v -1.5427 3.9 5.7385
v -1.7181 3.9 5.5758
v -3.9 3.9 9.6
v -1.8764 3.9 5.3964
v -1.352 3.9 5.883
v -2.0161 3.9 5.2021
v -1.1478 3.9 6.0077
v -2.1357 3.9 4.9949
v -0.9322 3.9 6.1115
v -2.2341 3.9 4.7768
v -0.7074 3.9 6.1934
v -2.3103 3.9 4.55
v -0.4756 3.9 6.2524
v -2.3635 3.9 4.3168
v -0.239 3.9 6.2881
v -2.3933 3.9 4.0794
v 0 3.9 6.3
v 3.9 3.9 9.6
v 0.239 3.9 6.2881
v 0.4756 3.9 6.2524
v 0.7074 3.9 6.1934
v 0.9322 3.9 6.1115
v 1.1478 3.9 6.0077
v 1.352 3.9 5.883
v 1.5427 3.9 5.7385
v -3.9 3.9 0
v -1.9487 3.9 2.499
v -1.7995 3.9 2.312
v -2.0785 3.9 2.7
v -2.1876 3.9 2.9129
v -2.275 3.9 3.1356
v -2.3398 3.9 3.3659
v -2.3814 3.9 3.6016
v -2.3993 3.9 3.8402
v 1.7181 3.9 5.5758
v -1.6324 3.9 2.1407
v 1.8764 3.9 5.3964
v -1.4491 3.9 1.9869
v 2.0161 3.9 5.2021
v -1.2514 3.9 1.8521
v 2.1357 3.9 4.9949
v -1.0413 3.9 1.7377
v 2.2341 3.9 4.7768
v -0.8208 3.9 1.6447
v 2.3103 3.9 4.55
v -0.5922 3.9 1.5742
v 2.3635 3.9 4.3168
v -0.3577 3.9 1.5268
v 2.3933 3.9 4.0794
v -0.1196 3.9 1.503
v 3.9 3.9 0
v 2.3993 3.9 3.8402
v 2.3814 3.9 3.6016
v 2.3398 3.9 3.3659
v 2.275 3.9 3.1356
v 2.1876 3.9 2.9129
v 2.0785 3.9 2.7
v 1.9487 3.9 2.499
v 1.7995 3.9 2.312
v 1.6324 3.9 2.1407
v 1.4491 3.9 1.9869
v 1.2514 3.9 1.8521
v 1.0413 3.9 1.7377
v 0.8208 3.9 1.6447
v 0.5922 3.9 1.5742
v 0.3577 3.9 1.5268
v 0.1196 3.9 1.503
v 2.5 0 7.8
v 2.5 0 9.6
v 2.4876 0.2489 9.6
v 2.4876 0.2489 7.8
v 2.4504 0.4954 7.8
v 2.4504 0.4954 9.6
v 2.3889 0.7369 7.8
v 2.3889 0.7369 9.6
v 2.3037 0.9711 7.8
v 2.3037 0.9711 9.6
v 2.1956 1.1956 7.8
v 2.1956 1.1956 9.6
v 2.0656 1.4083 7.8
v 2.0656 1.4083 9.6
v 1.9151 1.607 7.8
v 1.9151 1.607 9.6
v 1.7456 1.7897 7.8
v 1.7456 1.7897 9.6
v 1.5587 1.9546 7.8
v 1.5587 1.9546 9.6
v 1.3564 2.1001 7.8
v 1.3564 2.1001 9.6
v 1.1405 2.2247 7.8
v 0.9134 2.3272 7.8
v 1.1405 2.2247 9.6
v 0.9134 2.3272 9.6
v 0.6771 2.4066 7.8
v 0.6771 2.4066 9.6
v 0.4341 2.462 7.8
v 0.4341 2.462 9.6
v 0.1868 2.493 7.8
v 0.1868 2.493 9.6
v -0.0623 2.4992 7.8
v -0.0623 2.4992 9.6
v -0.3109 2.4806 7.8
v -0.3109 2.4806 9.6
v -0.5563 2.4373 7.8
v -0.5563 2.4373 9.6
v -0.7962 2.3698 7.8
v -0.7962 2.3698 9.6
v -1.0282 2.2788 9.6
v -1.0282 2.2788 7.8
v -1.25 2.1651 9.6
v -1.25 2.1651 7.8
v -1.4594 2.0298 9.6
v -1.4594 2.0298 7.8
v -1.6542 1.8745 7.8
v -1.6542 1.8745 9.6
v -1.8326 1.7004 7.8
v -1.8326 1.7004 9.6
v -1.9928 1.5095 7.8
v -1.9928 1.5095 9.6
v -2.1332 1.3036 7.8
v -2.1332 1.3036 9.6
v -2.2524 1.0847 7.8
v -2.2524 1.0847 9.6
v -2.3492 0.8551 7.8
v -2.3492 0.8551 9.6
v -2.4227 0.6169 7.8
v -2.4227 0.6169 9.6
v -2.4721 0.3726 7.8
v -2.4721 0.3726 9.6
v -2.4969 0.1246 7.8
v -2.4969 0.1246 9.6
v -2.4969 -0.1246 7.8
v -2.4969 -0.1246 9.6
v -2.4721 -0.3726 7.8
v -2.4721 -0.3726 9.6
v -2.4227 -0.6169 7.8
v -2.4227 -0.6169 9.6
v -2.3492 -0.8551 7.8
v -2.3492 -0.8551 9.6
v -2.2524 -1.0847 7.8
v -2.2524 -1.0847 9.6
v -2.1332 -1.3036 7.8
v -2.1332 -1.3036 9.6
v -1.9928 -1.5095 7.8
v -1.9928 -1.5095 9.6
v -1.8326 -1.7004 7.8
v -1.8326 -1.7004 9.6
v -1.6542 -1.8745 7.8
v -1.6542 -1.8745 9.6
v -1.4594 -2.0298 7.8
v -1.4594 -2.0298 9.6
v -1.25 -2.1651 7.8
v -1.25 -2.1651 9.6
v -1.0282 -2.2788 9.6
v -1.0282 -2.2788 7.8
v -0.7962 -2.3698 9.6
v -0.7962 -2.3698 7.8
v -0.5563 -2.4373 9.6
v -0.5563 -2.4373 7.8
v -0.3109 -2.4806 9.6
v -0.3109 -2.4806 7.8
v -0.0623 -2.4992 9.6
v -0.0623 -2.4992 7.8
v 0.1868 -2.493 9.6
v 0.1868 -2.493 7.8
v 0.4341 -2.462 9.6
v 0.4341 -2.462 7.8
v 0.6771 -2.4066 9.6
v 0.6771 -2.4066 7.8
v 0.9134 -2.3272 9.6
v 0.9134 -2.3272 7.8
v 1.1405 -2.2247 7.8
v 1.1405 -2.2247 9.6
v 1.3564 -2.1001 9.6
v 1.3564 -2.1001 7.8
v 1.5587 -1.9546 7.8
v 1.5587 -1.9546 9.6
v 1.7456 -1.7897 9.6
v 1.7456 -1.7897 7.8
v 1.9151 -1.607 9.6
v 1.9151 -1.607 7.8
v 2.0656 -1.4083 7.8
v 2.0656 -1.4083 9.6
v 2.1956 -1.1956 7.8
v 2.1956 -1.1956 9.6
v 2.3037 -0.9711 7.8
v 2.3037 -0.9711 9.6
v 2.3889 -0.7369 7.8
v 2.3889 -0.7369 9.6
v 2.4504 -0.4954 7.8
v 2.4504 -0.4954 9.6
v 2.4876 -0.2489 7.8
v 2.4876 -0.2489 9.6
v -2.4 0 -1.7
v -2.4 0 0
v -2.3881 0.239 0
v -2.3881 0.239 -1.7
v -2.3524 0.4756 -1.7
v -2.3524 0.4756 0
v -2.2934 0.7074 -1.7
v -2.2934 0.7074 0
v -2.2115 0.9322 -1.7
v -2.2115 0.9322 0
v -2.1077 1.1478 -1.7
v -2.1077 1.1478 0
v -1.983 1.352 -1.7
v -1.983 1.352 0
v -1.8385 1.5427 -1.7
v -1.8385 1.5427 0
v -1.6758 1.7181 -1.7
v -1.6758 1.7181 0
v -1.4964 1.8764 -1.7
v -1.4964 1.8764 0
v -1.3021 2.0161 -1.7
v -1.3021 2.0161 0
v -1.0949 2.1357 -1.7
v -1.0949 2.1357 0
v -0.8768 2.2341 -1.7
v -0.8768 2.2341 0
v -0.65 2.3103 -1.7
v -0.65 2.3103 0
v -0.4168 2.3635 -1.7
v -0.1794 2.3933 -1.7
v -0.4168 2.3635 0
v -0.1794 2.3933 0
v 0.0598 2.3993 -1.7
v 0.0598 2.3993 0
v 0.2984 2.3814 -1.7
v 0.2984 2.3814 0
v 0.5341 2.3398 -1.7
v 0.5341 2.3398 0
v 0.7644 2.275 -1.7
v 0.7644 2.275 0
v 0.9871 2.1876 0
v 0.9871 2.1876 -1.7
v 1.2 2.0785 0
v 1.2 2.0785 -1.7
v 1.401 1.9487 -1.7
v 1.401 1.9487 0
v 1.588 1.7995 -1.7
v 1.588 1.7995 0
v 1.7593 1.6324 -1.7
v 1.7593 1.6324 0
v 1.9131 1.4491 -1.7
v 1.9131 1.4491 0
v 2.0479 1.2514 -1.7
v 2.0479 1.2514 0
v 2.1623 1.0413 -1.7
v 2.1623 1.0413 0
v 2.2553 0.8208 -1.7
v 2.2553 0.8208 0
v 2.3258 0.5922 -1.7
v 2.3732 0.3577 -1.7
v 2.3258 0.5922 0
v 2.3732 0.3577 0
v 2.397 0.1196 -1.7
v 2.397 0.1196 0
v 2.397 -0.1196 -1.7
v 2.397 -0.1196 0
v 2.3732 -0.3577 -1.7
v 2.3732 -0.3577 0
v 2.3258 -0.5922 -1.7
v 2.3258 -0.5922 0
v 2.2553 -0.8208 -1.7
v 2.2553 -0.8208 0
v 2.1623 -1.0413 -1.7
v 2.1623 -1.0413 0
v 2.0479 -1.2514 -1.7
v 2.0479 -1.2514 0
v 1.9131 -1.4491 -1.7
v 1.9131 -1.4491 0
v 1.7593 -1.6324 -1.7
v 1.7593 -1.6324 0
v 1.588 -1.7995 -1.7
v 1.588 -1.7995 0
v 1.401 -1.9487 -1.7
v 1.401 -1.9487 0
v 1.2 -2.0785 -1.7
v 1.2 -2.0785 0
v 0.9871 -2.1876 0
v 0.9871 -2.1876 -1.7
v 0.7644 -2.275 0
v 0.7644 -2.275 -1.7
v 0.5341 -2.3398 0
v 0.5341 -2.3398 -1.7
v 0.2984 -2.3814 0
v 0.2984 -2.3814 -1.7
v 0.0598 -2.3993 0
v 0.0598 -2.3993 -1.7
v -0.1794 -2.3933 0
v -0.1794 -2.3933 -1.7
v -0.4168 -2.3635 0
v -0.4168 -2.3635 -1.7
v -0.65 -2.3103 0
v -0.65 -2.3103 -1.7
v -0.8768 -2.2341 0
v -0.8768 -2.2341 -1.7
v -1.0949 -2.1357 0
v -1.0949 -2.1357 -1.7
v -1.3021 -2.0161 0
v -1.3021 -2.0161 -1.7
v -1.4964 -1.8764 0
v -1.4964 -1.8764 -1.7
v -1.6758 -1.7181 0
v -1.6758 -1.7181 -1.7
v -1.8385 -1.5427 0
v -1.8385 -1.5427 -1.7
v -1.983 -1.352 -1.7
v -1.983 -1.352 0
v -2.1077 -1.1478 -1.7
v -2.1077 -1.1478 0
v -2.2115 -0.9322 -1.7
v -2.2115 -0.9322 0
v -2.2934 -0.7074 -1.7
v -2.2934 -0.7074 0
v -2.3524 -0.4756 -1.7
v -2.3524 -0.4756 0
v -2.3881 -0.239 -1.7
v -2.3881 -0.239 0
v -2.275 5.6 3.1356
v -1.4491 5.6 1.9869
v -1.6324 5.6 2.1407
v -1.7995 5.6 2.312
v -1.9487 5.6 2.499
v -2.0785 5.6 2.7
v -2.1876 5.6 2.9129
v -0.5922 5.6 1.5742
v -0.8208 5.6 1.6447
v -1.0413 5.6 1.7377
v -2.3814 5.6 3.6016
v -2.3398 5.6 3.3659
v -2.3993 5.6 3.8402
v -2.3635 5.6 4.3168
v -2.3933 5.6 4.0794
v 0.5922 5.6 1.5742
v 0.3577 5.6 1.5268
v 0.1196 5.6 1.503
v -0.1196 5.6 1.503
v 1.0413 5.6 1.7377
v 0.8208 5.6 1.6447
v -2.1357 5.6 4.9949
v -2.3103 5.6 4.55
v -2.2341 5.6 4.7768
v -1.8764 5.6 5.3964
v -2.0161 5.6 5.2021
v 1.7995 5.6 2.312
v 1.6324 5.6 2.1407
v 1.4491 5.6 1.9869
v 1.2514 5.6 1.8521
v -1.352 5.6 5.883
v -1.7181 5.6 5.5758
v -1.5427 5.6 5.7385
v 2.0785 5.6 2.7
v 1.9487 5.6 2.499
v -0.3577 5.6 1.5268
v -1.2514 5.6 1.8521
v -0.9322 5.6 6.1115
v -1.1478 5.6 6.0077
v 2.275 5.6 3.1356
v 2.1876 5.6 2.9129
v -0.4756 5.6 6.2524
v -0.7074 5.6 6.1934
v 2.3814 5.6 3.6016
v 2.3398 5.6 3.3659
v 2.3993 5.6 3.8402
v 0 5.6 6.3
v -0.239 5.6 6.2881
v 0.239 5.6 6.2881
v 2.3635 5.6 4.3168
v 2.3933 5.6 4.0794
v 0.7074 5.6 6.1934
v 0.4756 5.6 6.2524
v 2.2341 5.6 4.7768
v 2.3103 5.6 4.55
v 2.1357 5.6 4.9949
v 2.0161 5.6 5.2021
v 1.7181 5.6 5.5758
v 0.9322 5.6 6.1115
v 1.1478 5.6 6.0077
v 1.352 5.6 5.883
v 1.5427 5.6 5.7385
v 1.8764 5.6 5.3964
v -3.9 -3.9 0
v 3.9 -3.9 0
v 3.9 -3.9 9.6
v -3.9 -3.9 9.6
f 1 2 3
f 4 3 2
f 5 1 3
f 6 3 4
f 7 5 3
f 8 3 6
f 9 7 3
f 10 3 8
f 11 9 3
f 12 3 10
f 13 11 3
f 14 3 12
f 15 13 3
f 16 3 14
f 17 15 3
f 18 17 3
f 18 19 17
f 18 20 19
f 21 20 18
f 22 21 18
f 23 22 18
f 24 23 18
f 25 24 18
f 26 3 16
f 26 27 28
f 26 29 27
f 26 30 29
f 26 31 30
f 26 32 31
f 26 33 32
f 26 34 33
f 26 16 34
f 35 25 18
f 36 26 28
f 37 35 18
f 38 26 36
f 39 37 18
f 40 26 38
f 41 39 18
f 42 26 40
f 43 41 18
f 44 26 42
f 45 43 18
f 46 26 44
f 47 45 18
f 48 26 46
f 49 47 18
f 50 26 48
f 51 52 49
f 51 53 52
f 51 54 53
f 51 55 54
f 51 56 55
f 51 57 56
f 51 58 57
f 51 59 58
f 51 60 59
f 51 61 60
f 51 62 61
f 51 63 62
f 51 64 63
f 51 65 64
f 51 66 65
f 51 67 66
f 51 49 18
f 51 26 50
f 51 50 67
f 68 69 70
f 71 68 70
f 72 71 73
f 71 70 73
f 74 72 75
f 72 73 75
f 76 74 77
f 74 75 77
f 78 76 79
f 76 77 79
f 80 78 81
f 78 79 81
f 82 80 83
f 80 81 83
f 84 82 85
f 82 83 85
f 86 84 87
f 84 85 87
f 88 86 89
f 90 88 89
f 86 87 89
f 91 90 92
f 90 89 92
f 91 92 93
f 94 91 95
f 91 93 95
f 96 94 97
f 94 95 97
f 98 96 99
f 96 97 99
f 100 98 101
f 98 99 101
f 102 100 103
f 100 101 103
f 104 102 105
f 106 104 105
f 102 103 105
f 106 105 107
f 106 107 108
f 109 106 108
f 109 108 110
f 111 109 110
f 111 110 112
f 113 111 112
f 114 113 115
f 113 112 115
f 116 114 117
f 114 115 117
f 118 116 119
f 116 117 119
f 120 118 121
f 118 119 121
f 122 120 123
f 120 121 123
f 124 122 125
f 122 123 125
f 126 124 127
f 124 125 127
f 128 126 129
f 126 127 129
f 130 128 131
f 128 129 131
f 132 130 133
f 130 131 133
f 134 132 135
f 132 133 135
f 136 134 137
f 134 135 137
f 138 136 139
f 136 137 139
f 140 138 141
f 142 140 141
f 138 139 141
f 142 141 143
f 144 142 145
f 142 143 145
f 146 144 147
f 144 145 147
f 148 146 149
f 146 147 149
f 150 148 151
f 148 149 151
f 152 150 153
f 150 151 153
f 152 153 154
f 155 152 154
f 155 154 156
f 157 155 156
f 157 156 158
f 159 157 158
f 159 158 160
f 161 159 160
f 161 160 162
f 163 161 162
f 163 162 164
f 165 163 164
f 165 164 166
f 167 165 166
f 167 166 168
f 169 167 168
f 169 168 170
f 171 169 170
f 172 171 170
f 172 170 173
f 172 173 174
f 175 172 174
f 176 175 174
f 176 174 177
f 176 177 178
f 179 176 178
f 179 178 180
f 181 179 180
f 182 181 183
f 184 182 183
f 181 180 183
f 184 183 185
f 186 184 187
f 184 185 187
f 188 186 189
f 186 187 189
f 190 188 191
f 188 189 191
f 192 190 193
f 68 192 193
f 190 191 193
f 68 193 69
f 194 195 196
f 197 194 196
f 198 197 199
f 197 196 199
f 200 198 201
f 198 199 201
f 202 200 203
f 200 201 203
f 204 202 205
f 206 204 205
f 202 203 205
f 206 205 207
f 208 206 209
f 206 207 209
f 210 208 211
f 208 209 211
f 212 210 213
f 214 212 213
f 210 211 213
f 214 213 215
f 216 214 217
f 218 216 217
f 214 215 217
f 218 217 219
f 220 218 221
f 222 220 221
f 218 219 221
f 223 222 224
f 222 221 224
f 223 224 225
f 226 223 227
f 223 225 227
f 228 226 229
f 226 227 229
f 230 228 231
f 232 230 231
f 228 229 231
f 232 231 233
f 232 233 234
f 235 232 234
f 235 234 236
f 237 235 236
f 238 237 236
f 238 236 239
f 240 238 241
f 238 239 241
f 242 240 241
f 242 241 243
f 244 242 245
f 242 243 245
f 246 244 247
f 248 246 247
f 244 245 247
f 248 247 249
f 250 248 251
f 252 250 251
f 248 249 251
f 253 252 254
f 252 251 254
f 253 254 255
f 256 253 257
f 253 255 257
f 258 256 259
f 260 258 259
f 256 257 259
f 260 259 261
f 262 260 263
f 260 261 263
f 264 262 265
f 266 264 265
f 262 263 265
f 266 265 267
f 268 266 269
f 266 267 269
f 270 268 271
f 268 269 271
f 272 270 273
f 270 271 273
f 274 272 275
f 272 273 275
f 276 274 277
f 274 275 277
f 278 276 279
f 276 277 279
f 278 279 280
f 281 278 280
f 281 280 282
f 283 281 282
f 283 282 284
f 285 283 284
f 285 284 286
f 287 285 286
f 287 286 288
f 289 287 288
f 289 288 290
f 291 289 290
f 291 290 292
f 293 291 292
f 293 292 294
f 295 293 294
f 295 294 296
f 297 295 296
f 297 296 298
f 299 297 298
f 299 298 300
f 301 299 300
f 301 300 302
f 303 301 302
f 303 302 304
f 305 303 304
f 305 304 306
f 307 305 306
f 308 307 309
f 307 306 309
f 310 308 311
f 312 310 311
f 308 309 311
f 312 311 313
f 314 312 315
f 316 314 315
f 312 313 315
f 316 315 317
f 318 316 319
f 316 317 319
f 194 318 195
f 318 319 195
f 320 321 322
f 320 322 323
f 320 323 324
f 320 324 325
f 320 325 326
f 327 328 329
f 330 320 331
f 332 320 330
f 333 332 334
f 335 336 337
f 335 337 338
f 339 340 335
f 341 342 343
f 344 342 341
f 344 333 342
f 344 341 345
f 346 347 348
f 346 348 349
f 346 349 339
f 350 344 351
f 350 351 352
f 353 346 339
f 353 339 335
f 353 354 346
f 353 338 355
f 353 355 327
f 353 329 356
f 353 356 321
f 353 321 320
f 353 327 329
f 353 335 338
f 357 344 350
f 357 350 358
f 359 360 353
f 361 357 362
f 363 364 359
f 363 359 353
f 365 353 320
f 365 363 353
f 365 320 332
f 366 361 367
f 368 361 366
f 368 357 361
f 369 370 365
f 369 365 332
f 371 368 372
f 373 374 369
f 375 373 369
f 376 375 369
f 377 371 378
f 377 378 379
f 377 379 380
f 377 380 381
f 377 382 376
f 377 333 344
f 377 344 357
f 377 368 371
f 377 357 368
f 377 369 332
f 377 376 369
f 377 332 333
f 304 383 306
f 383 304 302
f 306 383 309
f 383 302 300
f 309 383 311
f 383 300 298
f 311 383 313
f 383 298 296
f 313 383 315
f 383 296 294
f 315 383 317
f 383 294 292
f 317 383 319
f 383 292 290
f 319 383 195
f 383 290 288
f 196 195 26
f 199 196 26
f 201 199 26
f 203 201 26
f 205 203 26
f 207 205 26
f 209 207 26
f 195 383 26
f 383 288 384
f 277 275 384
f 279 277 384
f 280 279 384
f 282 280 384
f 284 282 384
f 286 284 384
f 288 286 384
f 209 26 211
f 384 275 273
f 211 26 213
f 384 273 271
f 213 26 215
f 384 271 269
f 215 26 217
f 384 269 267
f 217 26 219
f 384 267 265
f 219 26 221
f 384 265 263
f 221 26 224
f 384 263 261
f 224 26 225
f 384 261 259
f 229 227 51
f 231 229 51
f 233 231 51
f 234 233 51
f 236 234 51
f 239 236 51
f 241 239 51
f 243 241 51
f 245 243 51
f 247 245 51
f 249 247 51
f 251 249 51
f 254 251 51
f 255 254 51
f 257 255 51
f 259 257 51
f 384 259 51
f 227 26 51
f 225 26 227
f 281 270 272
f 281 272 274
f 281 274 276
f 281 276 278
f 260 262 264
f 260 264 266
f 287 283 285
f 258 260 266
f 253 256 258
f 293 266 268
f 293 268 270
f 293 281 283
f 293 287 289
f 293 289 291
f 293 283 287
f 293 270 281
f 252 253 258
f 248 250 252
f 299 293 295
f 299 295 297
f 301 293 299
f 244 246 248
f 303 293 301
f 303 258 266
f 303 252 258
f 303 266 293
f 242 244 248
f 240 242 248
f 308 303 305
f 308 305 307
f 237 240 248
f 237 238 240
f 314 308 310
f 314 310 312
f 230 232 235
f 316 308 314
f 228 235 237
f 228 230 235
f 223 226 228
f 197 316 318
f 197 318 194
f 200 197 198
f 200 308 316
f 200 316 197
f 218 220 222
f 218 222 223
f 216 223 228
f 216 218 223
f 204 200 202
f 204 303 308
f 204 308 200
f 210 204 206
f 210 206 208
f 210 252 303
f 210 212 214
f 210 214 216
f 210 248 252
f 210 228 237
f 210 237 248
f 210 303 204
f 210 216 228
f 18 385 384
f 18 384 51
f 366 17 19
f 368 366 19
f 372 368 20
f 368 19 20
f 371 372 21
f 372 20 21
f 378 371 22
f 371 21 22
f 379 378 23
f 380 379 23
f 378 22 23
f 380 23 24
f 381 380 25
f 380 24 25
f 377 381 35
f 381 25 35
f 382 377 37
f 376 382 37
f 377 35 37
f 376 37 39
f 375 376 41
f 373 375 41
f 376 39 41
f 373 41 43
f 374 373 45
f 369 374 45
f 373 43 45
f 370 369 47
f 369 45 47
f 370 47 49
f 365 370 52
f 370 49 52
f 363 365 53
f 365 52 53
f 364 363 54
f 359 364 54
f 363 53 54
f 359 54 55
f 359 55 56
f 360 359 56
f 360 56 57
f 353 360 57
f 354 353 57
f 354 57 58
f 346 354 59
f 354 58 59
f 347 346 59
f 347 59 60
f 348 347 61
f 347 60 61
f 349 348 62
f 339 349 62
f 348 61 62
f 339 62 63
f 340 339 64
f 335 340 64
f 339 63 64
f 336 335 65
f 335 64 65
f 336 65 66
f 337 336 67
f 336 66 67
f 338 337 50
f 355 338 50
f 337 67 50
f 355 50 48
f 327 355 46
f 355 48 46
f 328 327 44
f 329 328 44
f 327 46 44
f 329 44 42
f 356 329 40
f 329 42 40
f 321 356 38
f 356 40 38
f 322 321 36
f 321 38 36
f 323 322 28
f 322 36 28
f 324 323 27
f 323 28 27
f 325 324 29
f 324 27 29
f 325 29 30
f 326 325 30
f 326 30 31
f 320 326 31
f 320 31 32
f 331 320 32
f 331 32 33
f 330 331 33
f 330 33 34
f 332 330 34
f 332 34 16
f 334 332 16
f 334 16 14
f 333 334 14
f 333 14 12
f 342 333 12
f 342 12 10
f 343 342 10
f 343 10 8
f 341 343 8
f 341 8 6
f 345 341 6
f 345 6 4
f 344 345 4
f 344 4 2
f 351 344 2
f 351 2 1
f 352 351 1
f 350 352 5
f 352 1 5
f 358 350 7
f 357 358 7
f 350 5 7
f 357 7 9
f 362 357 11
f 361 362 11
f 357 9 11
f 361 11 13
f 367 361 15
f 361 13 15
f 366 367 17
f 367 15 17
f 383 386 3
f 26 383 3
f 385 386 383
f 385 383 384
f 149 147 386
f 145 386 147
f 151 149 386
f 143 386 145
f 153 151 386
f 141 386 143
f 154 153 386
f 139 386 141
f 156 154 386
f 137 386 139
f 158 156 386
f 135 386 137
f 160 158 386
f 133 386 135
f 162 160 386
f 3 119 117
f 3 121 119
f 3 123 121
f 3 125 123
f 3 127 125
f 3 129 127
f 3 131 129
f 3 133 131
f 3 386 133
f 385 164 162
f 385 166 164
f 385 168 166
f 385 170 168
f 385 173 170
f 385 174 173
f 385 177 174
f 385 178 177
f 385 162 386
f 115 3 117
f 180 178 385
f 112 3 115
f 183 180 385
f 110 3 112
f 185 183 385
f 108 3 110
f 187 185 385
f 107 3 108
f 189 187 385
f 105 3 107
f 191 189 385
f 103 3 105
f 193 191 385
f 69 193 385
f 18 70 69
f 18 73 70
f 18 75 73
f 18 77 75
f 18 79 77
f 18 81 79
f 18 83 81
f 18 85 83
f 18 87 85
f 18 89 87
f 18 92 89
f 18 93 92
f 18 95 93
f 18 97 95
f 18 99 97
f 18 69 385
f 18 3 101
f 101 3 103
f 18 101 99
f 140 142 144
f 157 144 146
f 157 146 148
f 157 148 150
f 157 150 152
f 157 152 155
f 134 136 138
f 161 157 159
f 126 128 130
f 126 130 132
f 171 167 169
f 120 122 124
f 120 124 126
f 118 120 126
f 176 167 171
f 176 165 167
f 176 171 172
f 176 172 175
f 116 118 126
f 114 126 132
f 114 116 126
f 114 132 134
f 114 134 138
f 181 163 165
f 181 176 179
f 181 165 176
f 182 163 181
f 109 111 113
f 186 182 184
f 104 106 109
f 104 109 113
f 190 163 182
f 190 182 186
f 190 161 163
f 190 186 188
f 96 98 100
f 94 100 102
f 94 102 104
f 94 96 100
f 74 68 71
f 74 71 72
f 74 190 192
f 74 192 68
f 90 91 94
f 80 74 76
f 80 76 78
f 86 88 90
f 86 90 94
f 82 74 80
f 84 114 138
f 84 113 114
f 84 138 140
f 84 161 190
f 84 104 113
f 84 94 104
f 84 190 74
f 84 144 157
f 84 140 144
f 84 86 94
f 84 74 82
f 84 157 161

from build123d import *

# Parameters (mm, degrees)
SKETCH_1_W          = 7.8
SKETCH_1_H          = 7.8
EXTRUDE_1_DEPTH     = 9.6
SKETCH_2_R          = 2.4
EXTRUDE_2_DEPTH     = 1.7
SKETCH_3_R          = 2.5
CUT_EXTRUDE_1_DEPTH = 1.8
SKETCH_5_R          = 2.4
EXTRUDE_3_DEPTH     = 1.7


with BuildPart() as part:
    # Эскиз1 → Бобышка-Вытянуть1 (new body)
    with BuildSketch(Plane.XY):
        Rectangle(SKETCH_1_W, SKETCH_1_H)
    extrude(amount=EXTRUDE_1_DEPTH)

    # Эскиз2 → Бобышка-Вытянуть2 (add)
    with BuildSketch(Plane(origin=(0, 0, 0), x_dir=(-1, 0, 0), z_dir=(0, 0, -1))):
        Circle(SKETCH_2_R)
    extrude(amount=EXTRUDE_2_DEPTH)

    # Эскиз3 → Вырез-Вытянуть1 (cut)
    with BuildSketch(Plane.XY.offset(9.6)):
        Circle(SKETCH_3_R)
    extrude(amount=-CUT_EXTRUDE_1_DEPTH, mode=Mode.SUBTRACT)

    # Эскиз5 → Бобышка-Вытянуть3 (add)
    with BuildSketch(Plane(origin=(0, 3.9, 0), x_dir=(1, 0, 0), z_dir=(0, 1, 0))):
        with Locations(Location((0, -3.9, 0), (0, 0, 270))):
            Circle(SKETCH_5_R)
    extrude(amount=EXTRUDE_3_DEPTH)


solid = part.part
